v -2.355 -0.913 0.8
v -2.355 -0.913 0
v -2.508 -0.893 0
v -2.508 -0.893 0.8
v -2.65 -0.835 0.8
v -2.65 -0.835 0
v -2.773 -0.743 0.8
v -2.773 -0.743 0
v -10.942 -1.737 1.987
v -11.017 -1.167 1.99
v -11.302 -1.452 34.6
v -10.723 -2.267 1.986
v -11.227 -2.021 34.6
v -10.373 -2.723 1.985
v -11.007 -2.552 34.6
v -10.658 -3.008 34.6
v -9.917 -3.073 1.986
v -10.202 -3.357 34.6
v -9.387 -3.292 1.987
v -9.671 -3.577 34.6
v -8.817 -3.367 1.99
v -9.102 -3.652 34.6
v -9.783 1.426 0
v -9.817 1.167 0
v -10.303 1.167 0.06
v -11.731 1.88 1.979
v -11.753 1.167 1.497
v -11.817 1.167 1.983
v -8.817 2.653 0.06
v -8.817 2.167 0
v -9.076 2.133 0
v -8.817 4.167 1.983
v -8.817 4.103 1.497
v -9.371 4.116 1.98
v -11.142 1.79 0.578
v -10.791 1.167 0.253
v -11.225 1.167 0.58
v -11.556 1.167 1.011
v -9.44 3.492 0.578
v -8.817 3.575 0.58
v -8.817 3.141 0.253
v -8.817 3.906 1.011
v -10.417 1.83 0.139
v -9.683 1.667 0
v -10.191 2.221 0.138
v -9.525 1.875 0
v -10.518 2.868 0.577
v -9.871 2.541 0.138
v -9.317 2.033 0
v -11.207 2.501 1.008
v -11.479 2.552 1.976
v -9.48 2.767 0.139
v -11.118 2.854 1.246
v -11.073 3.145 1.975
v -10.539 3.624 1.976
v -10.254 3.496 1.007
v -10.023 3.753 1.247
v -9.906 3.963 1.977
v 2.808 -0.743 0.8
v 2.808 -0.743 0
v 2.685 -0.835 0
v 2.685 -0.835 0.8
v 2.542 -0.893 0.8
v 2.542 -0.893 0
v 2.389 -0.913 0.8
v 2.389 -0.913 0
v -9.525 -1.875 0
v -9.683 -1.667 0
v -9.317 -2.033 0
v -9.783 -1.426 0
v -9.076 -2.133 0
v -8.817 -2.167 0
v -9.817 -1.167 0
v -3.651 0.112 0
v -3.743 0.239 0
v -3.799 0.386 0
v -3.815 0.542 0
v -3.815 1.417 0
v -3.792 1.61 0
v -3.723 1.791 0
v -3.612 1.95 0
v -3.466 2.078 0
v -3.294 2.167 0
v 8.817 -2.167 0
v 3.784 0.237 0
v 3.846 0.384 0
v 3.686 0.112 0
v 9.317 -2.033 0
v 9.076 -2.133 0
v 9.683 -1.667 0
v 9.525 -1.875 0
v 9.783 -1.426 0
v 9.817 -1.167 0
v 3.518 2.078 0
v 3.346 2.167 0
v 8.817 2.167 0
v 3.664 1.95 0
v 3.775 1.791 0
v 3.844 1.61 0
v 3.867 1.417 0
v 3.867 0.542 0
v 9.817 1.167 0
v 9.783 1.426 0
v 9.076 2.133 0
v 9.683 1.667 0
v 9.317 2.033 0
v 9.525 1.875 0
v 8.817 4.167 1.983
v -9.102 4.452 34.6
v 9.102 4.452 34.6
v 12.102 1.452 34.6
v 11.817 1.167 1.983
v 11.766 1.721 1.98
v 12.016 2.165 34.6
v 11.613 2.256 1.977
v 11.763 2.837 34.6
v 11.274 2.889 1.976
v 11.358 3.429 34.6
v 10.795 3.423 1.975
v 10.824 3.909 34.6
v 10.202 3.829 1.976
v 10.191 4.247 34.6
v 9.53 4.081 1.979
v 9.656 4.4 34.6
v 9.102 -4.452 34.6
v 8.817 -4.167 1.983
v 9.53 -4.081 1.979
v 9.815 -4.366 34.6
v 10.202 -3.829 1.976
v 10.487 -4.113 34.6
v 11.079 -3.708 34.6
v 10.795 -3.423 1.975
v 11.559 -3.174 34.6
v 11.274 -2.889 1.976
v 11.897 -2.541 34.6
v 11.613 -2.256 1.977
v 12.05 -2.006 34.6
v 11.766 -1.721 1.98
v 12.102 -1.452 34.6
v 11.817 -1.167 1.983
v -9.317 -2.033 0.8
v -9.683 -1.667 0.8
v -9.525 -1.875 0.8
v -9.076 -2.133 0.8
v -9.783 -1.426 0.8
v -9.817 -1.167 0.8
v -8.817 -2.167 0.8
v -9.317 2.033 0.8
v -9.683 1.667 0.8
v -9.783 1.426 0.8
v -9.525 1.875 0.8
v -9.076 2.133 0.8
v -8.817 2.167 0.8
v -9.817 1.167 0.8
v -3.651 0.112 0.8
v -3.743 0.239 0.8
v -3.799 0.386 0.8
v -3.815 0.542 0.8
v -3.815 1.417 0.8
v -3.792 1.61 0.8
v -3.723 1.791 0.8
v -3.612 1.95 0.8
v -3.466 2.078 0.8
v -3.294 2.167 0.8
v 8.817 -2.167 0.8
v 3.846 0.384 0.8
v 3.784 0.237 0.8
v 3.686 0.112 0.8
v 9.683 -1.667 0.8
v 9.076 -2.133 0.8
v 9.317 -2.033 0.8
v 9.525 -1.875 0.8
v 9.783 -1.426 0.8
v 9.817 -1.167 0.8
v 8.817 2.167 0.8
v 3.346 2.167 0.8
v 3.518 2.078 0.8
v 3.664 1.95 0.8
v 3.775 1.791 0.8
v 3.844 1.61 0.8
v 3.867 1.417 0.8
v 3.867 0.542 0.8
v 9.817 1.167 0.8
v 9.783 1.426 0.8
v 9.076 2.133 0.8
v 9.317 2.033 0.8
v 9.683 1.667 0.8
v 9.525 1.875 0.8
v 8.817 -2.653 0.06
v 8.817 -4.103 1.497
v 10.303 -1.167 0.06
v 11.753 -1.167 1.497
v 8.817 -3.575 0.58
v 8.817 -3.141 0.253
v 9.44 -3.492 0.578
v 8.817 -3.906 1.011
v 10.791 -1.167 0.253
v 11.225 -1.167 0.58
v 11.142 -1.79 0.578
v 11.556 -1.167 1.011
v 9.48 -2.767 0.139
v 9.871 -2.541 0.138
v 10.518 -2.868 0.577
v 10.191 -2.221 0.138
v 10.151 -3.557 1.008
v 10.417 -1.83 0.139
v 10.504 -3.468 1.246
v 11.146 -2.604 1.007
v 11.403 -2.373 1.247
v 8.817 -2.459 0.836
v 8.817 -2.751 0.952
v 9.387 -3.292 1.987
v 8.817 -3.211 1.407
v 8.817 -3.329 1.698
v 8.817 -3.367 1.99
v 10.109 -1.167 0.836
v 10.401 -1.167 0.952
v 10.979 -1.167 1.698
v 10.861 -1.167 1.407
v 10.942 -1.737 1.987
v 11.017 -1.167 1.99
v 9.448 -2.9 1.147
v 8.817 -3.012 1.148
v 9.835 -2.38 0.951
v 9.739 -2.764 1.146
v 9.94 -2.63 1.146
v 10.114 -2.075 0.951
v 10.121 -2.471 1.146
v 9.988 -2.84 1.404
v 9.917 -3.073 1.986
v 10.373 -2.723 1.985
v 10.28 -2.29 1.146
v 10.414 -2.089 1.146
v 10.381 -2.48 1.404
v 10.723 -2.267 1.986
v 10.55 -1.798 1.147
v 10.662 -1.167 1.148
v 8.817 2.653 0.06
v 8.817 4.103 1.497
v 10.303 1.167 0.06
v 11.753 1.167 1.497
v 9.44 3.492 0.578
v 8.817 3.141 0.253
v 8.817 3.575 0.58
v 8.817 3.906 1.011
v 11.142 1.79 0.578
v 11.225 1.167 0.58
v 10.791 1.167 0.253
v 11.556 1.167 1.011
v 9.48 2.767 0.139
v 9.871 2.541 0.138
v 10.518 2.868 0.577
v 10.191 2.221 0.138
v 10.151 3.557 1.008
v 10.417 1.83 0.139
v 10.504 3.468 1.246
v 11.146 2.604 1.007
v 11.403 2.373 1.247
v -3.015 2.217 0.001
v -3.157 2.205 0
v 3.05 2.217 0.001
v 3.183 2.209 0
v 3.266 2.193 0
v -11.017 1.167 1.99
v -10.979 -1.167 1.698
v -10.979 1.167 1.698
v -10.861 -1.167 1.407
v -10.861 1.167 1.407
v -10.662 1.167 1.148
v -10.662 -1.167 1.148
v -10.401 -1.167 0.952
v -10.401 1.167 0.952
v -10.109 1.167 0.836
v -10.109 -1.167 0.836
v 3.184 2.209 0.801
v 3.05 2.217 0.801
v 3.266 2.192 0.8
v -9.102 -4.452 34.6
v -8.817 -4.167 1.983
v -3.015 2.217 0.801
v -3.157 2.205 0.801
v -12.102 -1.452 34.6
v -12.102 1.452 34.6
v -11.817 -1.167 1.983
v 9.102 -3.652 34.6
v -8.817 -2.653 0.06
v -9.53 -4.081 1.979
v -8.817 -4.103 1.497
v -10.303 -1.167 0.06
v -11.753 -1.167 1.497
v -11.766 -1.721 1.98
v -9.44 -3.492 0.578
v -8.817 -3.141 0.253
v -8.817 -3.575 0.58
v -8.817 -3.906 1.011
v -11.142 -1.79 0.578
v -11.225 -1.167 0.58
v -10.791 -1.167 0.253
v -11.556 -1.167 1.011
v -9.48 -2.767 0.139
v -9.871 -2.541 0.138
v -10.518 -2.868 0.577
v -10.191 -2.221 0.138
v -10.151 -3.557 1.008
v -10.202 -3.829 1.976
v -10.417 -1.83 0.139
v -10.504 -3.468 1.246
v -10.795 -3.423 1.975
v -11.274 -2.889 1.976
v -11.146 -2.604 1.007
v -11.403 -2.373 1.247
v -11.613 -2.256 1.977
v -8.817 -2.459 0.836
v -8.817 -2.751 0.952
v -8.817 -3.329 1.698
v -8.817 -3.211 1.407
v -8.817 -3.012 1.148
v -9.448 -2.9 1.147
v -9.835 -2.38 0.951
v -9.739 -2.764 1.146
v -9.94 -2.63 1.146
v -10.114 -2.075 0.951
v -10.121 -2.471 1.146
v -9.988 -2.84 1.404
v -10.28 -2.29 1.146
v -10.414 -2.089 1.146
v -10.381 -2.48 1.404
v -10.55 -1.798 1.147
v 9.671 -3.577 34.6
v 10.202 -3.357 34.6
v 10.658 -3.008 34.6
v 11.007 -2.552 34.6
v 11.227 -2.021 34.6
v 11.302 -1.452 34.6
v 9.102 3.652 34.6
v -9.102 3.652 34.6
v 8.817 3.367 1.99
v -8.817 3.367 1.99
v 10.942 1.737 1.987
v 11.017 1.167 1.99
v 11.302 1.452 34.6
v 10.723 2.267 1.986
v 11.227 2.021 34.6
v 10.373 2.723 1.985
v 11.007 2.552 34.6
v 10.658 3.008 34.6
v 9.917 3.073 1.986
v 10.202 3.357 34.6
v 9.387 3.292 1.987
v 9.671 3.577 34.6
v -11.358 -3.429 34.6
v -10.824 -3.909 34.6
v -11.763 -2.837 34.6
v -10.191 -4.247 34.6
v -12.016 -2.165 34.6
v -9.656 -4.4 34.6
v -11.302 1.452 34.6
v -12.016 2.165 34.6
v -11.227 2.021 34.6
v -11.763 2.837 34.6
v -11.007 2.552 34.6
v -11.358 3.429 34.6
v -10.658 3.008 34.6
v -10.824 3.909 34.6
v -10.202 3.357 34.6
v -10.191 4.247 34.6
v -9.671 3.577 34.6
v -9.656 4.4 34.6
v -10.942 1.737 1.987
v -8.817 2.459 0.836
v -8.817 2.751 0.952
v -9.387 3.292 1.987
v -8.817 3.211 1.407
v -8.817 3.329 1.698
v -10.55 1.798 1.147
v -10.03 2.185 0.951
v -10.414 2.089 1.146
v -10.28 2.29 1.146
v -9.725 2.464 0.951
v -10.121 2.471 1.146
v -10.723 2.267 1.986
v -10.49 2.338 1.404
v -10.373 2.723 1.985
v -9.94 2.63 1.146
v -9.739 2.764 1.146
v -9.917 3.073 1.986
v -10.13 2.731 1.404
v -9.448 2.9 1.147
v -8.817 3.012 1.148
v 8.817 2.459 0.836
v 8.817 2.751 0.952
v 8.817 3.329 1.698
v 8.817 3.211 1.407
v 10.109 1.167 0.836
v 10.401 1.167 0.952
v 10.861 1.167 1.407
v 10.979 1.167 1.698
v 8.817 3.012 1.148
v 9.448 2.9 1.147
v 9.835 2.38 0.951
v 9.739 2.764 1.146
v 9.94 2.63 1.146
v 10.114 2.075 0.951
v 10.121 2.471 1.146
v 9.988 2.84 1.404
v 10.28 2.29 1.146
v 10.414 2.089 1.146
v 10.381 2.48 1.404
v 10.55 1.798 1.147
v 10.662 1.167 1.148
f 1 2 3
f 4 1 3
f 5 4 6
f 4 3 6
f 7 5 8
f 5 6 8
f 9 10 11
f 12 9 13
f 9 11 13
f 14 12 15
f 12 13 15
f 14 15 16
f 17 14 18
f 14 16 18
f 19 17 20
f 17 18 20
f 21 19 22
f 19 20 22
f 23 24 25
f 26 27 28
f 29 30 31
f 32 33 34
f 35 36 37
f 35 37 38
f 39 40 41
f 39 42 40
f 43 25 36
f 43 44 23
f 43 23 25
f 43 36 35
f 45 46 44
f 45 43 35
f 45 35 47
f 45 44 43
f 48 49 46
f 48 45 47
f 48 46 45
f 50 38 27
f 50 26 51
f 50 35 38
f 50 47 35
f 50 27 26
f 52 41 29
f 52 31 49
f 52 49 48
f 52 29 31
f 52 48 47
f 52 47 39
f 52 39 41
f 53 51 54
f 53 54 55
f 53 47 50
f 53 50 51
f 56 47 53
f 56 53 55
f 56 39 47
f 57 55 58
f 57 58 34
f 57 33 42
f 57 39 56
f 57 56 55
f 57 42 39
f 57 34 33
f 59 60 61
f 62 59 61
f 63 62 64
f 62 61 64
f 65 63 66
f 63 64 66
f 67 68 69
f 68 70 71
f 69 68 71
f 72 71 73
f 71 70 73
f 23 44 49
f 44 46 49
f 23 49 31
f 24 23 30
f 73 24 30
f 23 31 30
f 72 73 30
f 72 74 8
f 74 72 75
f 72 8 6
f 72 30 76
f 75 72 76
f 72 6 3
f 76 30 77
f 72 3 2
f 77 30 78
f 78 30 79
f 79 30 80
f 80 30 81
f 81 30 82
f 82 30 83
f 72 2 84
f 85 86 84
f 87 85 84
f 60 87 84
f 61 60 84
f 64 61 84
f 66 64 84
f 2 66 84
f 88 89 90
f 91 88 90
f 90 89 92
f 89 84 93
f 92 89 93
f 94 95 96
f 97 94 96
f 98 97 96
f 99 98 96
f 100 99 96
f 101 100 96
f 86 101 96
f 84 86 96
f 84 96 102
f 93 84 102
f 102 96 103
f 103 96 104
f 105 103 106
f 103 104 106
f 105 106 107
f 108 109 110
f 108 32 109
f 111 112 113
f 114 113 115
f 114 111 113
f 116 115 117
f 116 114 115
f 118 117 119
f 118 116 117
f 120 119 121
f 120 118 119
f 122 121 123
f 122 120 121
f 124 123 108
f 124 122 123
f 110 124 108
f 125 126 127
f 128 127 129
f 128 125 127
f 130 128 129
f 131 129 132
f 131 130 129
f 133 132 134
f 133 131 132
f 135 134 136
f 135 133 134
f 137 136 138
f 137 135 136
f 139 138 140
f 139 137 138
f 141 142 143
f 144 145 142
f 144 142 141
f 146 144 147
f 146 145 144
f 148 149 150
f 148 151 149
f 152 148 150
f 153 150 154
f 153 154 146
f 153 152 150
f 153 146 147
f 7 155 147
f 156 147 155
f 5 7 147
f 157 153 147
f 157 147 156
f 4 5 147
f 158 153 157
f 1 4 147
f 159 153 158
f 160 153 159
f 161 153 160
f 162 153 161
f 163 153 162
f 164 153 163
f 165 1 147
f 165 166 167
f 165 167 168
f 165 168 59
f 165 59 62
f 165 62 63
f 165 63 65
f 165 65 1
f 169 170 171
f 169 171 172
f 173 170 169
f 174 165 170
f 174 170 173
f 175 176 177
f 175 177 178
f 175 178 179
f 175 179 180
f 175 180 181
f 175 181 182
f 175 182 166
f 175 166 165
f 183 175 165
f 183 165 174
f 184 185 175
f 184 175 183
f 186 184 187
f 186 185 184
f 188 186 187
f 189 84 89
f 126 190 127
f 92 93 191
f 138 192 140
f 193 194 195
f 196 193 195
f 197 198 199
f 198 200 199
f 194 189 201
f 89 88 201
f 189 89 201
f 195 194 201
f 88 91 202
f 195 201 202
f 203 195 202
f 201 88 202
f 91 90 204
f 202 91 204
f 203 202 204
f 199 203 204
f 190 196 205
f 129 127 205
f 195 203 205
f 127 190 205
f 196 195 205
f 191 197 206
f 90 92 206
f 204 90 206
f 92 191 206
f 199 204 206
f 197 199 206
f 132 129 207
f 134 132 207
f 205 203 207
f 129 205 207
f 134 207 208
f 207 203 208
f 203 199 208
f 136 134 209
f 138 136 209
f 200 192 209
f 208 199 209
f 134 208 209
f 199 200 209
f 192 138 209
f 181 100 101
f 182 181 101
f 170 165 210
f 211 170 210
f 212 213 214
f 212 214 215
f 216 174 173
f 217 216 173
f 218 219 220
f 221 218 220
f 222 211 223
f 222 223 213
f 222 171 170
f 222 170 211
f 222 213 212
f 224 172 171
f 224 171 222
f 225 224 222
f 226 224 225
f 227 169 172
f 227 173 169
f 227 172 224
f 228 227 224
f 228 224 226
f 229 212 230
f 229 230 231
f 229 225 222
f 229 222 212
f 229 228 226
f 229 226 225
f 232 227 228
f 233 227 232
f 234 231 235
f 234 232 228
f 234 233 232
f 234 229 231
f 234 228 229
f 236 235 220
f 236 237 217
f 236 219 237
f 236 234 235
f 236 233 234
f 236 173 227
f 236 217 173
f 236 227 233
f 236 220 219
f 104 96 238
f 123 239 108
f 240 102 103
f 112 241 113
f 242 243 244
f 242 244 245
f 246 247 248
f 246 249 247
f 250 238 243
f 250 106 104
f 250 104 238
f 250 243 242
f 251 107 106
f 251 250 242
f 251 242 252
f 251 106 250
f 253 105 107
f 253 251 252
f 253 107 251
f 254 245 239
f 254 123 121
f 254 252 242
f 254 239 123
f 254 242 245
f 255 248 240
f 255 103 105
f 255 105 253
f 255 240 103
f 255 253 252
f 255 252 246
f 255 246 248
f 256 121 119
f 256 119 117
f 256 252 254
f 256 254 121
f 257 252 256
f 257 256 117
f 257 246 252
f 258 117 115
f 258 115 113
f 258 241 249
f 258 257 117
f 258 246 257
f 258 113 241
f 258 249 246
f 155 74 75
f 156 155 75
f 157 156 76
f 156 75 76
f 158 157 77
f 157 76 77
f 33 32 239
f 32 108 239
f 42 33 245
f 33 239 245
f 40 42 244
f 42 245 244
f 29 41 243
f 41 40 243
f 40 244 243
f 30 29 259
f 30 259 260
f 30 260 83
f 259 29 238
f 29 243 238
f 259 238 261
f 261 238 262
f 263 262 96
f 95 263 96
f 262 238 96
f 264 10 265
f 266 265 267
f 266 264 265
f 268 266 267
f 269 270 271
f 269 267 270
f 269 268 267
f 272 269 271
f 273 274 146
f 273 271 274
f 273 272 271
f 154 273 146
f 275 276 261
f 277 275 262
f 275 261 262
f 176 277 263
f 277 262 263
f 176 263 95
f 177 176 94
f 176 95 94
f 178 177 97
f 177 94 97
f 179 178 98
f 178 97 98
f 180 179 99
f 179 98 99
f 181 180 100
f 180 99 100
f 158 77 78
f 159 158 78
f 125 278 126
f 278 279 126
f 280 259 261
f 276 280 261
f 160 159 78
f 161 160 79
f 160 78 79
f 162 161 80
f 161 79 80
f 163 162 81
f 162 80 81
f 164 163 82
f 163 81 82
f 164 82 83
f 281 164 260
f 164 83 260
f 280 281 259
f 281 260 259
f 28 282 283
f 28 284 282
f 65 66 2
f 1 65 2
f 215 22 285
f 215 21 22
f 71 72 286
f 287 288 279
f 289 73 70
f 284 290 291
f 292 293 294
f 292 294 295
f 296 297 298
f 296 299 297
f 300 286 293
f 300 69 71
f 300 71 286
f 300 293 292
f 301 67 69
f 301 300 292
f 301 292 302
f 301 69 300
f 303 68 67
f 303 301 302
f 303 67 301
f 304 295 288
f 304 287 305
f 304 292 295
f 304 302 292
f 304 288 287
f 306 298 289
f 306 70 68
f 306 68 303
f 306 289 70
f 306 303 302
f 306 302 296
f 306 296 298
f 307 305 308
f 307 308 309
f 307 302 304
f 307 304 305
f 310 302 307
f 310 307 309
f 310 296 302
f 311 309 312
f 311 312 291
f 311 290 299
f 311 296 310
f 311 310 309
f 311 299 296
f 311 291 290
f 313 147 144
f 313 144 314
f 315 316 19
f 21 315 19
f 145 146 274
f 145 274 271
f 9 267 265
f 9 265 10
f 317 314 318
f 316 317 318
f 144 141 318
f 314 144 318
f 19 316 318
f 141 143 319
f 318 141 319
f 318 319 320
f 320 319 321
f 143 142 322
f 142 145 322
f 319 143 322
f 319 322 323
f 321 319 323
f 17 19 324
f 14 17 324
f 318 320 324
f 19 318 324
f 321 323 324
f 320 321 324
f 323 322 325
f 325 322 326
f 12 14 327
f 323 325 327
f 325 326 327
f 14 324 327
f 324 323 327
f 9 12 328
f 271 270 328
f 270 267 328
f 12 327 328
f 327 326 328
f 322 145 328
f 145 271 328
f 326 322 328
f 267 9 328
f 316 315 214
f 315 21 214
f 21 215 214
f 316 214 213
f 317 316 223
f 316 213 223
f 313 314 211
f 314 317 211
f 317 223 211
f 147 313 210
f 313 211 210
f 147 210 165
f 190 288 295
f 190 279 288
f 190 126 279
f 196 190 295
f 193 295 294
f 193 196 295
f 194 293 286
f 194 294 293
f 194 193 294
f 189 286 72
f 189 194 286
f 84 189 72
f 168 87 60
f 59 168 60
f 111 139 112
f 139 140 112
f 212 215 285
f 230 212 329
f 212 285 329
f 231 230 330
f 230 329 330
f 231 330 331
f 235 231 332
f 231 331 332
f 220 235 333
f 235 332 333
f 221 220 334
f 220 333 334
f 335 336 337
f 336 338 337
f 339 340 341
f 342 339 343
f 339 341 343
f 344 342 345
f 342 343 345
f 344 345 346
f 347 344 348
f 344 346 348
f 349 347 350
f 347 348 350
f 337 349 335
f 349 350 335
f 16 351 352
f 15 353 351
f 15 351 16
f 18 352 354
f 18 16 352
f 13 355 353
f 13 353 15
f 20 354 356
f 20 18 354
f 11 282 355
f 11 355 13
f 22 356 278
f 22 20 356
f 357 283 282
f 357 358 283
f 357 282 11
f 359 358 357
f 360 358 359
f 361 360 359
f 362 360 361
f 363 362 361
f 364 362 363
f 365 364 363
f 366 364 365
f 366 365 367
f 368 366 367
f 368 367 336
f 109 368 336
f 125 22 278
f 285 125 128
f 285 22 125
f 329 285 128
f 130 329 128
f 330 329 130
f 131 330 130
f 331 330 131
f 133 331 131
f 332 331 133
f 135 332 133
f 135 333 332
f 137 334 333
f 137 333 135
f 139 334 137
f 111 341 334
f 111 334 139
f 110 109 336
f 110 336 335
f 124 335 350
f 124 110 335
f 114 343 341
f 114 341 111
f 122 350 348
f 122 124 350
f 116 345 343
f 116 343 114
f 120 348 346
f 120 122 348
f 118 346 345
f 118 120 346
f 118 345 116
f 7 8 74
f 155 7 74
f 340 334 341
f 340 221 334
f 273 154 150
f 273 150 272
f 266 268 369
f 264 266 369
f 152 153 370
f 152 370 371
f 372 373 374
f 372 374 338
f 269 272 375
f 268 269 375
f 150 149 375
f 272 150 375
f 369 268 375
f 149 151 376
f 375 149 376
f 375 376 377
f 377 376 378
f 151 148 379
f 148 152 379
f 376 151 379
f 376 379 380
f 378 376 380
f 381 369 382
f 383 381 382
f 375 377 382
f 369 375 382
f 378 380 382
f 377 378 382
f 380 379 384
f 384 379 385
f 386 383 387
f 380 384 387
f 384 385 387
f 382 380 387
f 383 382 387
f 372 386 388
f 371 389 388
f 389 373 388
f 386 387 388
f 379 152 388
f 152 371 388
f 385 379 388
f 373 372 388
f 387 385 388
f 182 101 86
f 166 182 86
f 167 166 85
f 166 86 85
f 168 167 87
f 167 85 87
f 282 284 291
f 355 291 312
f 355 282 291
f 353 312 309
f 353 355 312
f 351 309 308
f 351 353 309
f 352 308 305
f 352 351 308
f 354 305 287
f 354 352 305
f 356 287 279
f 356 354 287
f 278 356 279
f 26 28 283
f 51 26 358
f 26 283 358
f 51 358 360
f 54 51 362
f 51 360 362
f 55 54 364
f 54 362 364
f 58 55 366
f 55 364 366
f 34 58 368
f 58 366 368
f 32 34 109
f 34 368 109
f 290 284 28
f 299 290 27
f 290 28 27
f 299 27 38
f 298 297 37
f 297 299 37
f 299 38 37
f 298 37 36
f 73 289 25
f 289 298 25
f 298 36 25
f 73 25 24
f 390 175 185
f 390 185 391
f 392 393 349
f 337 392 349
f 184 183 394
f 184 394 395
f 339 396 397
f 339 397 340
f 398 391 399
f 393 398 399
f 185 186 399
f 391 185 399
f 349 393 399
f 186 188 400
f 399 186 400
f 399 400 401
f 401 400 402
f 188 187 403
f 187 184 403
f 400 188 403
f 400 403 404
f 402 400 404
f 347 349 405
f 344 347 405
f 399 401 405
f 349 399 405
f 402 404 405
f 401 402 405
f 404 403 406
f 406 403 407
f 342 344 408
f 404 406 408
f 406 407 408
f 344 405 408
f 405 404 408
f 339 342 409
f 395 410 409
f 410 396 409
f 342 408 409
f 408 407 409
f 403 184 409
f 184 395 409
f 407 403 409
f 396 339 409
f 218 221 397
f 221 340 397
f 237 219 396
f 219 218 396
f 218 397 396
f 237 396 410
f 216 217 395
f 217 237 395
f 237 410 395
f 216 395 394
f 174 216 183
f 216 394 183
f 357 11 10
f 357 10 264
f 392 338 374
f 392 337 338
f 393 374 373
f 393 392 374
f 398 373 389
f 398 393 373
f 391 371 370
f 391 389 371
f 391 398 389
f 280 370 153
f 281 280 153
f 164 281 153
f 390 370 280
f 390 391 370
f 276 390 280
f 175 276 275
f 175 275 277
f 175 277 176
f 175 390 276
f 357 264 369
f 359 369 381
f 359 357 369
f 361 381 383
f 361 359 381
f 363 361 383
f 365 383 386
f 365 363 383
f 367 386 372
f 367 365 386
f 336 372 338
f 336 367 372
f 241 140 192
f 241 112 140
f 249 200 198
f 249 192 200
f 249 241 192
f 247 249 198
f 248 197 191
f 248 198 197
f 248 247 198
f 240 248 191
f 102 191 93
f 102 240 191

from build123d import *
from OCP.BRepFilletAPI import BRepFilletAPI_MakeFillet

# Parameters (mm, degrees)
SKETCH2_W           = 23.6
SKETCH2_H           = 8.3
BOSS_EXTRUDE1_DEPTH = 34.6
BOSS_EXTRUDE1_DRAFT = -0.5
FILLET1_R1          = 2
FILLET1_R2          = 3
SHELL1_T            = -0.8
CUT_EXTRUDE1_DEPTH  = 33.85


with BuildPart() as part:
    # Sketch2 → Boss-Extrude1 (with draft: the straight prism first)
    with BuildSketch(Plane.XY):
        Rectangle(SKETCH2_W, SKETCH2_H)
    extrude(amount=BOSS_EXTRUDE1_DEPTH)
    # Boss-Extrude1: the draft: its side faces are tilted about the plane it starts from
    boss_extrude1_sides = [part.faces().sort_by_distance(p)[0] for p in [
        (0, -4.15, 17.3),
        (11.8, 0, 17.3),
        (0, 4.15, 17.3),
        (-11.8, 0, 17.3),
    ]]
    draft(boss_extrude1_sides, Plane.XY, BOSS_EXTRUDE1_DRAFT)

    # Fillet1: one fillet with a radius per group of edges: ONE call of the kernel's fillet builder (fillet() takes one radius for all edges)
    fillet1_edges_1 = [part.edges().sort_by_distance(p)[0] for p in [
        (0, -4.15, 0),
        (-11.8, 0, 0),
        (0, 4.15, 0),
        (11.8, 0, 0),
    ]]
    fillet1_edges_2 = [part.edges().sort_by_distance(p)[0] for p in [
        (11.950974813, -4.300974813, 17.3),
        (-11.950974813, -4.300974813, 17.3),
        (-11.950974813, 4.300974813, 17.3),
        (11.950974813, 4.300974813, 17.3),
    ]]
    fillet1 = BRepFilletAPI_MakeFillet(part.part.solid().wrapped)
    for e in fillet1_edges_1:
        fillet1.Add(FILLET1_R1, e.wrapped)
    for e in fillet1_edges_2:
        fillet1.Add(FILLET1_R2, e.wrapped)
    add(Compound.cast(fillet1.Shape()), mode=Mode.REPLACE)

    # Shell1
    shell1_openings = [part.faces().sort_by_distance(p)[0] for p in [
        (0, 0, 34.6),
    ]]
    offset(amount=SHELL1_T, openings=shell1_openings, kind=Kind.INTERSECTION)

    # Sketch3 → Cut-Extrude1 (cut)
    with BuildSketch(Plane(origin=(0, 0, 0), x_dir=(-1, 0, 0), z_dir=(0, 0, -1))):
        with BuildLine():
            Line((3.01539715, 2.217301425), (-3.05, 2.217301425))
            ThreePointArc((-3.05, 2.217301425), (-3.626903312, 1.989192787), (-3.867301425, 1.417301425))
            Line((-3.867301425, 1.417301425), (-3.867301425, 0.541731715))
            ThreePointArc((-3.867301425, 0.541731715), (-3.820065179, 0.308381695), (-3.685793986, 0.111773604))
            Line((-3.685793986, 0.111773604), (-2.807954647, -0.742656685))
            ThreePointArc((-2.807954647, -0.742656685), (-2.615321704, -0.868564956), (-2.389462086, -0.912698575))
            Line((-2.389462086, -0.912698575), (2.354859236, -0.912698575))
            ThreePointArc((2.354859236, -0.912698575), (2.580718854, -0.868564956), (2.773351797, -0.742656685))
            Line((2.773351797, -0.742656685), (3.651191136, 0.111773604))
            ThreePointArc((3.651191136, 0.111773604), (3.776159697, 0.310381805), (3.81539715, 0.541731715))
            Line((3.81539715, 0.541731715), (3.81539715, 1.417301425))
            ThreePointArc((3.81539715, 1.417301425), (3.581082575, 1.98298685), (3.01539715, 2.217301425))
        make_face()
    extrude(amount=-CUT_EXTRUDE1_DEPTH, mode=Mode.SUBTRACT)


solid = part.part
